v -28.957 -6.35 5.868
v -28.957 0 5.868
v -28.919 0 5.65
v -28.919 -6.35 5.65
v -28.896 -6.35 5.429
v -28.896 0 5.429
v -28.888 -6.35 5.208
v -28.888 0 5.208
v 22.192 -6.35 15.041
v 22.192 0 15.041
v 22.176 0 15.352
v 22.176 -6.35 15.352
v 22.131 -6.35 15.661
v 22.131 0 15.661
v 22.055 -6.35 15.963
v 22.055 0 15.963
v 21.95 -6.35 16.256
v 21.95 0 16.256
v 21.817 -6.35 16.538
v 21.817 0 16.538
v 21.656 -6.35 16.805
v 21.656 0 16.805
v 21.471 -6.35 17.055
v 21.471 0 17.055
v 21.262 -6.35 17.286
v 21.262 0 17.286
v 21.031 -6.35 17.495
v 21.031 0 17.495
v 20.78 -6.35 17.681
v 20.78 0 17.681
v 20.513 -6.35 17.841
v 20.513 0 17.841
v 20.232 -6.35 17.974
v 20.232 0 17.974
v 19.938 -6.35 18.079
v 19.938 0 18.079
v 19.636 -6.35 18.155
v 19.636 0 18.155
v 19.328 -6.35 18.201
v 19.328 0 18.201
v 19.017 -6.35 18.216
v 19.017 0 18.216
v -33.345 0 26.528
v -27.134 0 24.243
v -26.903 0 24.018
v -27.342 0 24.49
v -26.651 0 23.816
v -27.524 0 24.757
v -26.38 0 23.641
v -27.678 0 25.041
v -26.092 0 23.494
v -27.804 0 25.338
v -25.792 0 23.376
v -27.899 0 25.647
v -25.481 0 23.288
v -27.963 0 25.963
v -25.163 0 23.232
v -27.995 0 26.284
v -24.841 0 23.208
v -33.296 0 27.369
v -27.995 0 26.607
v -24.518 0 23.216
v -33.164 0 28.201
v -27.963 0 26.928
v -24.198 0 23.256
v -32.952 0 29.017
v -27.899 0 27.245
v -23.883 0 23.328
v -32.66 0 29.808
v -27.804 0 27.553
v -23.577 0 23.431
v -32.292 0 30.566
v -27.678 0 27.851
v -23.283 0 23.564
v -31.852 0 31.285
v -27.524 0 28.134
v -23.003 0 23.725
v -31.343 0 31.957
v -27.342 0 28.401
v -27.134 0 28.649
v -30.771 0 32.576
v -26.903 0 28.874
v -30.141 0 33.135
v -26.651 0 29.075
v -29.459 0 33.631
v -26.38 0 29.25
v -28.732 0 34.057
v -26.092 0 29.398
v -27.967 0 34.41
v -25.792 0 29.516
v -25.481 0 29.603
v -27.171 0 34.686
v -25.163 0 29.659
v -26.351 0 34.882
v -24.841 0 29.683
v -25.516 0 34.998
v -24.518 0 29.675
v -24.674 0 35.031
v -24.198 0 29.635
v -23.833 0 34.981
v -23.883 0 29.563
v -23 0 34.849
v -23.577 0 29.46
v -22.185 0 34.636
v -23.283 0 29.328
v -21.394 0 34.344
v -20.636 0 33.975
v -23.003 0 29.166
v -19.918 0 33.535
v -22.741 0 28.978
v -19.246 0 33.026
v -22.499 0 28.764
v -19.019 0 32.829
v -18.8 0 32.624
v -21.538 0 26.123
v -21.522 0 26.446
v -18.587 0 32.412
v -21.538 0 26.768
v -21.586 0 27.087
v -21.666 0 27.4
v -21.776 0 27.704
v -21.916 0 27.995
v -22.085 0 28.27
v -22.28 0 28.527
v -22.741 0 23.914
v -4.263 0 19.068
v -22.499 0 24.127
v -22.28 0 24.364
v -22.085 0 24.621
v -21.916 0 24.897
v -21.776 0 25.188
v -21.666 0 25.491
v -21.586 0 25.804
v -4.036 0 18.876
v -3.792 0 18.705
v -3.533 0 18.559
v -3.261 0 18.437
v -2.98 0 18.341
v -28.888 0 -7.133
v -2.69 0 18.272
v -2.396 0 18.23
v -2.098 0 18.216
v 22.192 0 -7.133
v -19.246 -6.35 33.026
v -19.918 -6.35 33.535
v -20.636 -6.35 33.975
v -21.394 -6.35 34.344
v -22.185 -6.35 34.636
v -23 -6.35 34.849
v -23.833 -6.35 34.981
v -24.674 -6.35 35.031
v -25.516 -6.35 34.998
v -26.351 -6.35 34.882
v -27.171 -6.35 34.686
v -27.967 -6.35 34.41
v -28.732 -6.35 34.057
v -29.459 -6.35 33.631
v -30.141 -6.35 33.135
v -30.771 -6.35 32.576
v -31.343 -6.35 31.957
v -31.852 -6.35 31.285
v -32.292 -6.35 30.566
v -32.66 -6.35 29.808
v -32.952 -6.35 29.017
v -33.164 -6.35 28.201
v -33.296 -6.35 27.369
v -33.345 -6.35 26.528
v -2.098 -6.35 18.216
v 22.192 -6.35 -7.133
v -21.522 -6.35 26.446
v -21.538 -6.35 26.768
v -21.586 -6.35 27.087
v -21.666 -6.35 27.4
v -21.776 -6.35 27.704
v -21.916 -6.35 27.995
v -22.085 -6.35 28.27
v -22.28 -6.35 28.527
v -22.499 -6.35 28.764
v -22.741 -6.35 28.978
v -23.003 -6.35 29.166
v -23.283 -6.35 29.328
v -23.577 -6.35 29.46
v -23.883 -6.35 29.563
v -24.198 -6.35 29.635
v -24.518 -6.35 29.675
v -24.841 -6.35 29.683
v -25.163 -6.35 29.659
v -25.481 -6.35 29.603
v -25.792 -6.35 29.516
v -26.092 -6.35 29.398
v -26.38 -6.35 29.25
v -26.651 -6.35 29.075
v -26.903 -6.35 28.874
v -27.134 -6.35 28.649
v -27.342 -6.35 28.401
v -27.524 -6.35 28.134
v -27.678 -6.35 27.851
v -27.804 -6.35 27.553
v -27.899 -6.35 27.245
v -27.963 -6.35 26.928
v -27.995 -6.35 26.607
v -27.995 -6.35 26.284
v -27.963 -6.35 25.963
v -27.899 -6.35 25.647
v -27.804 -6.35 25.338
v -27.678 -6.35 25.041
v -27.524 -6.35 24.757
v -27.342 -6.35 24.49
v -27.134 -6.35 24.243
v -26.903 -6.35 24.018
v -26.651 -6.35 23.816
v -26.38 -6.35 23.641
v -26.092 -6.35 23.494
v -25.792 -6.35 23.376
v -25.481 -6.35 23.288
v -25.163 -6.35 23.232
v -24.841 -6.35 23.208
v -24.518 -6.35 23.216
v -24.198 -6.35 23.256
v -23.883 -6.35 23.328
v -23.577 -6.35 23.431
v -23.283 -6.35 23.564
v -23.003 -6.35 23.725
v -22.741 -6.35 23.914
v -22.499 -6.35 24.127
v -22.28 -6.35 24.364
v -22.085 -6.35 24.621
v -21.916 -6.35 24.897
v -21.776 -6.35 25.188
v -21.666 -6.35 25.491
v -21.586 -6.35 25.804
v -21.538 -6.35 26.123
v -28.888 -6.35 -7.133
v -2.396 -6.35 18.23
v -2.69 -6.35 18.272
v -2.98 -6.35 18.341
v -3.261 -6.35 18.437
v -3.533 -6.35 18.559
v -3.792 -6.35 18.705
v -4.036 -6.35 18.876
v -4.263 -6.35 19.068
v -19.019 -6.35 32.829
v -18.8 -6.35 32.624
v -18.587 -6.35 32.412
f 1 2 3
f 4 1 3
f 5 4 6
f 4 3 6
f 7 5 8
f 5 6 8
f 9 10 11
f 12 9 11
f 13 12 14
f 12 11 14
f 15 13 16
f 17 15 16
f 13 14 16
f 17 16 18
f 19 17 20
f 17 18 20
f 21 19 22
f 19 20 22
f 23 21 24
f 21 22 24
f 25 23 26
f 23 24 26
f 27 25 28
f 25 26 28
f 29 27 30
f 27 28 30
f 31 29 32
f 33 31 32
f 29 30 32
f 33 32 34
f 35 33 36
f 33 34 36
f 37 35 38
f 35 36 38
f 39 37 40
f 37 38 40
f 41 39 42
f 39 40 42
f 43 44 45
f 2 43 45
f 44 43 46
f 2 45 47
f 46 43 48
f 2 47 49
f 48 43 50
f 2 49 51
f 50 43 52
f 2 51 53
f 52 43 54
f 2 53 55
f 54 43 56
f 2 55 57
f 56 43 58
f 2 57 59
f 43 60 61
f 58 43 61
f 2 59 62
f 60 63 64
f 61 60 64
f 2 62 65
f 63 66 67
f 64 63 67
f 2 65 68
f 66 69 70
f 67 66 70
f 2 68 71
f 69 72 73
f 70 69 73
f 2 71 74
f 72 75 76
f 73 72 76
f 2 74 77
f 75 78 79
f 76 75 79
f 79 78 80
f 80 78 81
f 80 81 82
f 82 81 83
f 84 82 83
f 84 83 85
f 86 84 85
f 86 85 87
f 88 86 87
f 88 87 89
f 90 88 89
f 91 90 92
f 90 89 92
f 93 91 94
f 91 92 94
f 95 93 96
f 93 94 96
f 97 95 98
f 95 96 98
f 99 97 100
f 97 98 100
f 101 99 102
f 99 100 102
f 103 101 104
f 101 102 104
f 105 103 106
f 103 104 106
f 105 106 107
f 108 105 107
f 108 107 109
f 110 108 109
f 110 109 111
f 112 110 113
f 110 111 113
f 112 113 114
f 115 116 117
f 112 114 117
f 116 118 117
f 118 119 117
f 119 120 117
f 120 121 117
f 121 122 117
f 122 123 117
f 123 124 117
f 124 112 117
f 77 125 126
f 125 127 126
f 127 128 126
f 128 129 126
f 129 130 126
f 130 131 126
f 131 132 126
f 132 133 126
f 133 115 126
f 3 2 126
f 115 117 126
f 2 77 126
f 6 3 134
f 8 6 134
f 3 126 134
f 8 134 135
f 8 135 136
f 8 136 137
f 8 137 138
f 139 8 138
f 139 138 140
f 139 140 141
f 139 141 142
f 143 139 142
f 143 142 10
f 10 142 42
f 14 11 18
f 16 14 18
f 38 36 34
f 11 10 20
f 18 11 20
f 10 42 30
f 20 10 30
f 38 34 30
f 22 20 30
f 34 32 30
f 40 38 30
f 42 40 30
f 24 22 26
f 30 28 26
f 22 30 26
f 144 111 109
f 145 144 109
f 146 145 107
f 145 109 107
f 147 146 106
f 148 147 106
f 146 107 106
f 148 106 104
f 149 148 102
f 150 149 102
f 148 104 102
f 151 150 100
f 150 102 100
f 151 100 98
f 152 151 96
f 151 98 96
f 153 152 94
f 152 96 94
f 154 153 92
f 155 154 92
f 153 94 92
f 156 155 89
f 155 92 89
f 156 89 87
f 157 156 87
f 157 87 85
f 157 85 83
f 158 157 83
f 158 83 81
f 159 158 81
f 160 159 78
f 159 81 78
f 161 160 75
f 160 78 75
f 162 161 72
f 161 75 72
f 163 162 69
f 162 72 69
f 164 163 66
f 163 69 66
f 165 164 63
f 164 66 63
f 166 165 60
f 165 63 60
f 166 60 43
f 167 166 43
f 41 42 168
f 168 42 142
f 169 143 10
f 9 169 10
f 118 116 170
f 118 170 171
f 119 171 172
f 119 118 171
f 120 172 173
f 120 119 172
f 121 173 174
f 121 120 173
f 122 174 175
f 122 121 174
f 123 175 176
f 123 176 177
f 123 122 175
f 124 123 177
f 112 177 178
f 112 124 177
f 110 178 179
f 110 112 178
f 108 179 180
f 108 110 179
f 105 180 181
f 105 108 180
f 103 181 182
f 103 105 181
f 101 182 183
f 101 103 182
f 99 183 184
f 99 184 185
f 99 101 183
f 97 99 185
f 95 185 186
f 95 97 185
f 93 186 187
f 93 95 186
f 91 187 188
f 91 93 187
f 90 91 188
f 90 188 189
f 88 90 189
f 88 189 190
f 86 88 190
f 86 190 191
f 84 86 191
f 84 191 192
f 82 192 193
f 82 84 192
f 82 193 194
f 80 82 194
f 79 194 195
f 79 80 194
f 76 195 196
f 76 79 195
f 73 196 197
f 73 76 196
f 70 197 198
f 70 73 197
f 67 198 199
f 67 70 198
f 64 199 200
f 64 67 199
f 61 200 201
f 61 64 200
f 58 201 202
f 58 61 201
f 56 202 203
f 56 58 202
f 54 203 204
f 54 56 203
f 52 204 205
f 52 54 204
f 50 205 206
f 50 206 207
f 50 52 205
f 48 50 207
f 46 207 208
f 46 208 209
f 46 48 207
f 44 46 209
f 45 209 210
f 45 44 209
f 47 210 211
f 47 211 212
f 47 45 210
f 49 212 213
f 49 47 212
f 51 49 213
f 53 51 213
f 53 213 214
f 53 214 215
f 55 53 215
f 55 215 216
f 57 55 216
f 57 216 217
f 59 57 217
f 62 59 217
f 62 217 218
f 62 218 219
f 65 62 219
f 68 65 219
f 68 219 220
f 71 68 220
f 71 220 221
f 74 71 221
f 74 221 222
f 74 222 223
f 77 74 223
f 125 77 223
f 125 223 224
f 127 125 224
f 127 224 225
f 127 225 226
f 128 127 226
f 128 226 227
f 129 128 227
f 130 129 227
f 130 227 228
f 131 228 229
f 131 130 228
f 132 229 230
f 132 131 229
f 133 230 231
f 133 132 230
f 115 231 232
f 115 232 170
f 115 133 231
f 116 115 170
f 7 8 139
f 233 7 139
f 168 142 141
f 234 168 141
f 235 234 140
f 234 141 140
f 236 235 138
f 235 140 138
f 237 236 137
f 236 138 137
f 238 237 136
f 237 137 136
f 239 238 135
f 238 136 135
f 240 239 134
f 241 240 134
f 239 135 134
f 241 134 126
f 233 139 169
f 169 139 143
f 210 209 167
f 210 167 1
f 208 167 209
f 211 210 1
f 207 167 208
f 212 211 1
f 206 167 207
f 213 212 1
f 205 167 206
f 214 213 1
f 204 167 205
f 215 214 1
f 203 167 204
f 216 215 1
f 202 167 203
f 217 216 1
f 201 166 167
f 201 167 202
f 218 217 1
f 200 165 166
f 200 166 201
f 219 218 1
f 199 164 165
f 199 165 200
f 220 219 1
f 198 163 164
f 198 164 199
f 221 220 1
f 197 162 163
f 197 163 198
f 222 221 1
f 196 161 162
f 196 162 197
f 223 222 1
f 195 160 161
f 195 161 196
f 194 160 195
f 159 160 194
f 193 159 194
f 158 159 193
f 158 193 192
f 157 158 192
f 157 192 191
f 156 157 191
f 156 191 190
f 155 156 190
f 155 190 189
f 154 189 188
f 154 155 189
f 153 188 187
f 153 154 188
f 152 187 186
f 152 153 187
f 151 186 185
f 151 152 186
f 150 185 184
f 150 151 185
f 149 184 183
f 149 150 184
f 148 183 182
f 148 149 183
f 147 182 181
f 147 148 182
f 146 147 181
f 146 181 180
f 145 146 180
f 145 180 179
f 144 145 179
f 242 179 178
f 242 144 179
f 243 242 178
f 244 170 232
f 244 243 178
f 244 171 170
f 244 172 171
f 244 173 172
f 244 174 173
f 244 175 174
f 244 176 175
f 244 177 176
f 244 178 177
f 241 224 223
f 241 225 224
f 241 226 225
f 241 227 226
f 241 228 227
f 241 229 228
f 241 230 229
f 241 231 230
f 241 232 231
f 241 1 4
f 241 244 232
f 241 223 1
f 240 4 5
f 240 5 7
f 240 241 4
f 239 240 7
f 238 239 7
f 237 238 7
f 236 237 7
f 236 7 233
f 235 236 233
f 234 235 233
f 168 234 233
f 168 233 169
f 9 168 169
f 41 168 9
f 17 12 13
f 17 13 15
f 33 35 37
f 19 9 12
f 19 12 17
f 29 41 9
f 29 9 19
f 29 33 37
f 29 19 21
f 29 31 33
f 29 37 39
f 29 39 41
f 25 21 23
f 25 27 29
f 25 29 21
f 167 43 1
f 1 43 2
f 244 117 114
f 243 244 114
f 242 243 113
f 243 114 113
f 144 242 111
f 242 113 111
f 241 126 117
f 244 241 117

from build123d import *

# Parameters (mm, degrees)
F0_R     = 3.2385
F1_DEPTH = 6.35


with BuildPart() as f1:
    # F0 (on Front) → F1 (new body)
    with BuildSketch(Plane.XZ):
        with BuildLine():
            Line((19.016519, 18.216161), (-2.098458, 18.216161))
            ThreePointArc((-2.098458, 18.216161), (-3.26134, 18.436786), (-4.262609, 19.068))
            Line((-4.262609, 19.068), (-18.587252, 32.412178))
            Line((-18.587252, 32.412178), (-19.245879, 33.025725))
            ThreePointArc((-19.245879, 33.025725), (-28.353882, 34.24271), (-33.345191, 26.527555))
            Line((-33.345191, 26.527555), (-28.95716, 5.867742))
            ThreePointArc((-28.95716, 5.867742), (-28.905248, 5.539737), (-28.887881, 5.208104))
            Line((-28.887881, 5.208104), (-28.887881, -7.133039))
            Line((-28.887881, -7.133039), (22.191519, -7.133039))
            Line((22.191519, -7.133039), (22.191519, 15.041161))
            ThreePointArc((22.191519, 15.041161), (21.261583, 17.286225), (19.016519, 18.216161))
        make_face()
        with Locations((-24.760381, 26.445761)):
            Circle(F0_R, mode=Mode.SUBTRACT)
        with BuildLine():
            Line((-19.245879, 33.025725), (-18.587252, 32.412178))
            ThreePointArc((-18.587252, 32.412178), (-18.908519, 32.72759), (-19.245879, 33.025725))
        make_face()
    extrude(amount=F1_DEPTH)


solid = f1.part
